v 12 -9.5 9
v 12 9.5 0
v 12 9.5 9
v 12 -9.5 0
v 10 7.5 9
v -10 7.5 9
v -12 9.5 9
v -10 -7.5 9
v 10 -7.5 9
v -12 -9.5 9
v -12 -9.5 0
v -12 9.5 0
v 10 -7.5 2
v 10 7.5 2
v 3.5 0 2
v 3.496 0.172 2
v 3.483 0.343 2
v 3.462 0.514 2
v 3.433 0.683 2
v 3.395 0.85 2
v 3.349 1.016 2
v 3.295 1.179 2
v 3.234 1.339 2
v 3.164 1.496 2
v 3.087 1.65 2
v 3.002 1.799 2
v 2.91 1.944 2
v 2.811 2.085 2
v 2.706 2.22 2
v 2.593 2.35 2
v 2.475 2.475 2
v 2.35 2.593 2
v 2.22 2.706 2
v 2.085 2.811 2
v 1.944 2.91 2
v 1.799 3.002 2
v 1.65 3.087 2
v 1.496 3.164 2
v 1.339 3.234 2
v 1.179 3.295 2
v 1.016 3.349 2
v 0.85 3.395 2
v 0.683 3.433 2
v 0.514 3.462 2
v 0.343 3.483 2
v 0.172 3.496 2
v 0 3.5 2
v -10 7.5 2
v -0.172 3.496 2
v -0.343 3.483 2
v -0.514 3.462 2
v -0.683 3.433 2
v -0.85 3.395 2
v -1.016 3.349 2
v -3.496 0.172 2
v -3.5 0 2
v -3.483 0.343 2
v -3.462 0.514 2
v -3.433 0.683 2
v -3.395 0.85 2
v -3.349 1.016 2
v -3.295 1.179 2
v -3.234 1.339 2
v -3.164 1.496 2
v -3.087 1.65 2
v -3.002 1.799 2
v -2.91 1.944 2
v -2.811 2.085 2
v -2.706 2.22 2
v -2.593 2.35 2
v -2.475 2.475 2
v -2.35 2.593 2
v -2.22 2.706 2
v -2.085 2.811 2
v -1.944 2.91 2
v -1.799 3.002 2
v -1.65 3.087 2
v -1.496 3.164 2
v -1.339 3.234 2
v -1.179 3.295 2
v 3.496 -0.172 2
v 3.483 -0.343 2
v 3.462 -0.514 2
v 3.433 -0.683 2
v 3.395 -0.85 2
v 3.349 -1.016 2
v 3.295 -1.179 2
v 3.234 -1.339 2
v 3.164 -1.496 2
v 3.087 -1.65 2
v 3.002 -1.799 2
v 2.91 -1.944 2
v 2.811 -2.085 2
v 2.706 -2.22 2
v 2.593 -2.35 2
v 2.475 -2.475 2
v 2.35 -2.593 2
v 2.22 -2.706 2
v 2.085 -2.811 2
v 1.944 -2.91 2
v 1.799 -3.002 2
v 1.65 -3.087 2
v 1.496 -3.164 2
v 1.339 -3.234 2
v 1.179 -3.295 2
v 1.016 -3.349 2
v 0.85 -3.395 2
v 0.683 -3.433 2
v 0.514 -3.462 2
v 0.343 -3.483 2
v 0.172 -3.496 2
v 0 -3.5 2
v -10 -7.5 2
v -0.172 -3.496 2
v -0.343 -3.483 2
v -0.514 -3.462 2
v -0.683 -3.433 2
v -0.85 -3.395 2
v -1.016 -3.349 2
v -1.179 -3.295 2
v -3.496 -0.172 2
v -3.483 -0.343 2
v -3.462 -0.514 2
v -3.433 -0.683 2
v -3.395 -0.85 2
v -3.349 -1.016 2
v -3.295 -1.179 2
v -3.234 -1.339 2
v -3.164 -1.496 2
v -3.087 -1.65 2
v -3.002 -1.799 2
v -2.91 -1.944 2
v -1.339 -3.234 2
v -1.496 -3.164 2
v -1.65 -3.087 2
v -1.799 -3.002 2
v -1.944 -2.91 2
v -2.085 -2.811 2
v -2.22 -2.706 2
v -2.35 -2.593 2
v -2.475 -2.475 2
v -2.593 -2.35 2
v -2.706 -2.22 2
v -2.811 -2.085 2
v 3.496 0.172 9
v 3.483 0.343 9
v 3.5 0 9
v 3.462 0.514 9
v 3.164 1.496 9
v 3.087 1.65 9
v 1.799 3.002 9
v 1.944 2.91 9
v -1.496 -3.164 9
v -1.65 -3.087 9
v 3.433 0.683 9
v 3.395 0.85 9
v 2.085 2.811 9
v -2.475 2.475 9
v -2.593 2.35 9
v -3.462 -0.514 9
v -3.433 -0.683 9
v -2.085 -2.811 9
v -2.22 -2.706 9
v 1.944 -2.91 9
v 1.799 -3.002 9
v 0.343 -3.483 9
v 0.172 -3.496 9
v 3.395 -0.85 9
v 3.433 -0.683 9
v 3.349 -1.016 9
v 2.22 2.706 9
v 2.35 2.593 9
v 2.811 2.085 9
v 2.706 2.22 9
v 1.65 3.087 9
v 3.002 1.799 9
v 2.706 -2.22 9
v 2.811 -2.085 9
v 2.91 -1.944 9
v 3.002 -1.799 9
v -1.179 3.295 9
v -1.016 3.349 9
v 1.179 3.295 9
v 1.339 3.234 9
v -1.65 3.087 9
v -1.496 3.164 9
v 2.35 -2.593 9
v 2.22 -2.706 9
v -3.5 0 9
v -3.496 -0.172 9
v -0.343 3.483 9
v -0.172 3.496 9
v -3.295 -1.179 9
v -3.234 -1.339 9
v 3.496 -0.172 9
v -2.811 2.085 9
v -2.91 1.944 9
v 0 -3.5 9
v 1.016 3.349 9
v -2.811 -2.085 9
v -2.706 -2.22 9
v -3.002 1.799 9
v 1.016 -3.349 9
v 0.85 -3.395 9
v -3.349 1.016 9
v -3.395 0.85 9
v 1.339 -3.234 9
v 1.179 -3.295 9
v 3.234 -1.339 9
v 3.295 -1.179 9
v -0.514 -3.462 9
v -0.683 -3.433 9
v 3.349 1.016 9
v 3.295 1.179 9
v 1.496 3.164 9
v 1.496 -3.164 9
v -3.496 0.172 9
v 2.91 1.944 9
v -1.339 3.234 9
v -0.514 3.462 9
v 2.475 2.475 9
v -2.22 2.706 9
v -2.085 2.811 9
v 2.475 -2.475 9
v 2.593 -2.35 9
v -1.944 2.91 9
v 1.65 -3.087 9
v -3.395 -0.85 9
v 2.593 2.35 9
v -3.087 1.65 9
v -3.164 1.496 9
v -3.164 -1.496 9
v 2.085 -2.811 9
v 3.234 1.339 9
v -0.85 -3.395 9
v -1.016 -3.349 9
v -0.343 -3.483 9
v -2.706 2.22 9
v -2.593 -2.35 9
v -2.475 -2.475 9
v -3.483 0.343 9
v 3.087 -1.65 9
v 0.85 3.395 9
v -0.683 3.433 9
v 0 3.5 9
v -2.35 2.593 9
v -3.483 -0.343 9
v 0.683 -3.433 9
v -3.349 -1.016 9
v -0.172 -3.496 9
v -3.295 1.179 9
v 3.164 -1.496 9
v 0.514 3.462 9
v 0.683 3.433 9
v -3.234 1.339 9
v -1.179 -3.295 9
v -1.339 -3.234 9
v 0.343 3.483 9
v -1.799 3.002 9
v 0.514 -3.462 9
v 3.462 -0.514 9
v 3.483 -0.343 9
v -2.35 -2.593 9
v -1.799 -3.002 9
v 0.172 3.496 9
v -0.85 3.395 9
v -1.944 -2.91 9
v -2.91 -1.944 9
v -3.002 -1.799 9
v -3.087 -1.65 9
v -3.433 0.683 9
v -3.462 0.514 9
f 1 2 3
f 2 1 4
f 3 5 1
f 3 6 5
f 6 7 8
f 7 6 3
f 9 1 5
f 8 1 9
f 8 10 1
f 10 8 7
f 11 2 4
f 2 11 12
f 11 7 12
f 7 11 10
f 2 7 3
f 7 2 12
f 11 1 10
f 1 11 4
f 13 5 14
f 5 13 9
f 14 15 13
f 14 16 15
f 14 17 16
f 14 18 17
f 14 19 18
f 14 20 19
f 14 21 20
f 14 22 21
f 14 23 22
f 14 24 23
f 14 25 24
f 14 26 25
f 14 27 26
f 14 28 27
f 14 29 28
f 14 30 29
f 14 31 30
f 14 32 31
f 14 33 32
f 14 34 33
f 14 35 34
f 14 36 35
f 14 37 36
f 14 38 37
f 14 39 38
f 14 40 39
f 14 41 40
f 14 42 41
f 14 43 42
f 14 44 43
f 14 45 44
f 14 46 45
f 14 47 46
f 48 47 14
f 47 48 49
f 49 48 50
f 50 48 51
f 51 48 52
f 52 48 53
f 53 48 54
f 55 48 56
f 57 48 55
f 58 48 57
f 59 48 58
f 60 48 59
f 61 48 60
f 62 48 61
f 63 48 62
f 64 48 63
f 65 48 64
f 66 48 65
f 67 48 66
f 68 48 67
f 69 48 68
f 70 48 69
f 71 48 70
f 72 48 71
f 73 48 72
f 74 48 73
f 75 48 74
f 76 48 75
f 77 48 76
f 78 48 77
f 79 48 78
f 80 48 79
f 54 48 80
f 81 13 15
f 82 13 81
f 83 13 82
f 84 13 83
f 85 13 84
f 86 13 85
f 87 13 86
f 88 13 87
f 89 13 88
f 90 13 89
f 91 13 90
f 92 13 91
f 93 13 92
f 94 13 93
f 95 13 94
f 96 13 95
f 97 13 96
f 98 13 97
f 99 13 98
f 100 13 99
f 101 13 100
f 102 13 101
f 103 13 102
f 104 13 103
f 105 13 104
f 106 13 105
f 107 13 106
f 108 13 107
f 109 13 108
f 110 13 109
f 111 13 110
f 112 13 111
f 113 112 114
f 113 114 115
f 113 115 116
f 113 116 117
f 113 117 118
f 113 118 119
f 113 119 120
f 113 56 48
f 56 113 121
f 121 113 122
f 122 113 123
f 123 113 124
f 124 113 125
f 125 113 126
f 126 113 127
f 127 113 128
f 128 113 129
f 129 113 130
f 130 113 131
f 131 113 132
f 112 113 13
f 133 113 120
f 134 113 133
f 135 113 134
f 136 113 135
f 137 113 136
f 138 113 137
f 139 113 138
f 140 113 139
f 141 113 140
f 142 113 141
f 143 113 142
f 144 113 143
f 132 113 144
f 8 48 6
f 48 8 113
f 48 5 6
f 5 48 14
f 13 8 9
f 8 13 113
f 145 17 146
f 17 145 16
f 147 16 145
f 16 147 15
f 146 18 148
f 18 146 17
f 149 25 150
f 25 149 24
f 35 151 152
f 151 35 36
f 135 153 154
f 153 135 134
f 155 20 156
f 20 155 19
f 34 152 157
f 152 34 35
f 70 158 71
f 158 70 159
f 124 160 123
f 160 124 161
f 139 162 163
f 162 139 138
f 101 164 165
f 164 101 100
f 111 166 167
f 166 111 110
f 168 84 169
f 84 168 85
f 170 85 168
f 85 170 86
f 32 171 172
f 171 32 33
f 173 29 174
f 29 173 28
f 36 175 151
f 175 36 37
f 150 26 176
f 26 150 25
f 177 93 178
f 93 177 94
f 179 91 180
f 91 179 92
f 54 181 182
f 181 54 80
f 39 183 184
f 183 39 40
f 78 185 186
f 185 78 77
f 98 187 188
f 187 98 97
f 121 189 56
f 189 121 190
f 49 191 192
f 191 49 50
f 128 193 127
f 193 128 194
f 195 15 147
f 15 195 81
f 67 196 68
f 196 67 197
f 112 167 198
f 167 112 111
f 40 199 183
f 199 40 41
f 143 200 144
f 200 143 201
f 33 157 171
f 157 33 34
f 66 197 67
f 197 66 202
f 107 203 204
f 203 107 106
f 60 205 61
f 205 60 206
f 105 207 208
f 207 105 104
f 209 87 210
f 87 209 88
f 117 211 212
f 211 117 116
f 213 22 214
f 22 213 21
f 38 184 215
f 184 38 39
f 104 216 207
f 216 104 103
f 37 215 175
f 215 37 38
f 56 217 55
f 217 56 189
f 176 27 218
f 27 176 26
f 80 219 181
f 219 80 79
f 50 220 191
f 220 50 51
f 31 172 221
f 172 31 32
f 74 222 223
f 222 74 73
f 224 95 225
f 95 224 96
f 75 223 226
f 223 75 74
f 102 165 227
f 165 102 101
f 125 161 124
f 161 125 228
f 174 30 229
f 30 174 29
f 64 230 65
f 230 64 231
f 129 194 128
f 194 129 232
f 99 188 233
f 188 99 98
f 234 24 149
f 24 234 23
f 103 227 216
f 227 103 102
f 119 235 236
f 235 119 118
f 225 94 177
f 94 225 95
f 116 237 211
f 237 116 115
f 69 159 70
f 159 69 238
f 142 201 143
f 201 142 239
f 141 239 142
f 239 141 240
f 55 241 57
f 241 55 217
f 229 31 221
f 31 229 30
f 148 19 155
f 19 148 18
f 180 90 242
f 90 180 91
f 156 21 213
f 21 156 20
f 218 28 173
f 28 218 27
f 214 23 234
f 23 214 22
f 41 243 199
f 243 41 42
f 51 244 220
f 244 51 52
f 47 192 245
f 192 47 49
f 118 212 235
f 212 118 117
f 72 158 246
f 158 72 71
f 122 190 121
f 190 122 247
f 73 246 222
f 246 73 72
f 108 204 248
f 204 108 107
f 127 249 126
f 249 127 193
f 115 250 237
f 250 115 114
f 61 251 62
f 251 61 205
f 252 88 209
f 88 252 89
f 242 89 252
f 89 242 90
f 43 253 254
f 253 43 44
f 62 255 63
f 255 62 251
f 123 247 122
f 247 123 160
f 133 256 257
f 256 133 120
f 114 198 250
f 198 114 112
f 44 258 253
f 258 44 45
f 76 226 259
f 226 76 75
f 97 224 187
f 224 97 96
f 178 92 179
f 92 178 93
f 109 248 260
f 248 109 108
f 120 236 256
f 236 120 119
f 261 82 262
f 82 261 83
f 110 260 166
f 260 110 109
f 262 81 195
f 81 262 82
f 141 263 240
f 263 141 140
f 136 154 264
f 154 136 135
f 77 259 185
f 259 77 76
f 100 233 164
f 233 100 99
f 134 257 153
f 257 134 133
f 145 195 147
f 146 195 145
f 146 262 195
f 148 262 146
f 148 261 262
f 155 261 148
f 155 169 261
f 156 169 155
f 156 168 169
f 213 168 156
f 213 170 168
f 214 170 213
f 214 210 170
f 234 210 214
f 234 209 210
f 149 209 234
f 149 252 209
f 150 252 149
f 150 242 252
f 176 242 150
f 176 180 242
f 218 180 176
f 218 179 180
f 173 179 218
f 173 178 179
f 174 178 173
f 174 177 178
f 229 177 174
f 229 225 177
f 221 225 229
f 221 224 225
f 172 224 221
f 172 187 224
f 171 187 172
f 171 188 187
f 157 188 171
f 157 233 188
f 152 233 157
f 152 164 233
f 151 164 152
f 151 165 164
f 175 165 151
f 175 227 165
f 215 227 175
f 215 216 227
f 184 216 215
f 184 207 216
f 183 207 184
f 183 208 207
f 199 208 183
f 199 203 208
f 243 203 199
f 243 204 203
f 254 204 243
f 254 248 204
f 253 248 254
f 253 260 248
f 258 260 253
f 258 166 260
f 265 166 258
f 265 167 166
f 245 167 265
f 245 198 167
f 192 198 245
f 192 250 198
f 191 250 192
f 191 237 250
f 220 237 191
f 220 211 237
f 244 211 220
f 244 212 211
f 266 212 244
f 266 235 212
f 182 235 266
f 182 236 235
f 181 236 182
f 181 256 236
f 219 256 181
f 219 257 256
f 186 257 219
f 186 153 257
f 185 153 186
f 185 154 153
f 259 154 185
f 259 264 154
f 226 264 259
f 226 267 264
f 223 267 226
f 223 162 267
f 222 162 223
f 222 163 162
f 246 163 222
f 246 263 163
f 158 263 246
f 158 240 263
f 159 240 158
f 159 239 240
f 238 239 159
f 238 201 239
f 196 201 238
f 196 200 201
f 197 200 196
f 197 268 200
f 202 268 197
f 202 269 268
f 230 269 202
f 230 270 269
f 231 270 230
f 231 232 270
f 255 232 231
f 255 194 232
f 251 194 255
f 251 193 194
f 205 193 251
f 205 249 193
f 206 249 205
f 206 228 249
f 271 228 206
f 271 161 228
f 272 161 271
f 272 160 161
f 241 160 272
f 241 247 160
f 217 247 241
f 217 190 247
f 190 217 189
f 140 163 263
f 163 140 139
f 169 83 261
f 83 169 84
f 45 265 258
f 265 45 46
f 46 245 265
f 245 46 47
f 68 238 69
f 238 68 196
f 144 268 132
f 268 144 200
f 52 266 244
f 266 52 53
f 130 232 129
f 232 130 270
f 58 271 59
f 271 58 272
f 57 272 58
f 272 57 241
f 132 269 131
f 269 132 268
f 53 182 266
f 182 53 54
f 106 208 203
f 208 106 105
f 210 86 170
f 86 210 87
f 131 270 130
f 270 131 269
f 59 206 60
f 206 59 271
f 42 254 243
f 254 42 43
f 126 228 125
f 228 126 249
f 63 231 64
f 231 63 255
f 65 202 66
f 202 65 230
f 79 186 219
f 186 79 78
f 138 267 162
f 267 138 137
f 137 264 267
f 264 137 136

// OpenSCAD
length = 20;
width =15;
height = 7;
diameter = 7;
thickness = 2;
eps = 0.01;
faces = 128;


difference(){
        
    translate([-(length/2 + thickness),-(width/2 + thickness),0]) 
        cube([length+thickness*2, width+thickness*2, height+thickness]);

    translate([-length/2,-width/2,thickness]) 
        cube([length,width,height+eps]);
}


cylinder(height+thickness,d=diameter,$fn=faces);
    
